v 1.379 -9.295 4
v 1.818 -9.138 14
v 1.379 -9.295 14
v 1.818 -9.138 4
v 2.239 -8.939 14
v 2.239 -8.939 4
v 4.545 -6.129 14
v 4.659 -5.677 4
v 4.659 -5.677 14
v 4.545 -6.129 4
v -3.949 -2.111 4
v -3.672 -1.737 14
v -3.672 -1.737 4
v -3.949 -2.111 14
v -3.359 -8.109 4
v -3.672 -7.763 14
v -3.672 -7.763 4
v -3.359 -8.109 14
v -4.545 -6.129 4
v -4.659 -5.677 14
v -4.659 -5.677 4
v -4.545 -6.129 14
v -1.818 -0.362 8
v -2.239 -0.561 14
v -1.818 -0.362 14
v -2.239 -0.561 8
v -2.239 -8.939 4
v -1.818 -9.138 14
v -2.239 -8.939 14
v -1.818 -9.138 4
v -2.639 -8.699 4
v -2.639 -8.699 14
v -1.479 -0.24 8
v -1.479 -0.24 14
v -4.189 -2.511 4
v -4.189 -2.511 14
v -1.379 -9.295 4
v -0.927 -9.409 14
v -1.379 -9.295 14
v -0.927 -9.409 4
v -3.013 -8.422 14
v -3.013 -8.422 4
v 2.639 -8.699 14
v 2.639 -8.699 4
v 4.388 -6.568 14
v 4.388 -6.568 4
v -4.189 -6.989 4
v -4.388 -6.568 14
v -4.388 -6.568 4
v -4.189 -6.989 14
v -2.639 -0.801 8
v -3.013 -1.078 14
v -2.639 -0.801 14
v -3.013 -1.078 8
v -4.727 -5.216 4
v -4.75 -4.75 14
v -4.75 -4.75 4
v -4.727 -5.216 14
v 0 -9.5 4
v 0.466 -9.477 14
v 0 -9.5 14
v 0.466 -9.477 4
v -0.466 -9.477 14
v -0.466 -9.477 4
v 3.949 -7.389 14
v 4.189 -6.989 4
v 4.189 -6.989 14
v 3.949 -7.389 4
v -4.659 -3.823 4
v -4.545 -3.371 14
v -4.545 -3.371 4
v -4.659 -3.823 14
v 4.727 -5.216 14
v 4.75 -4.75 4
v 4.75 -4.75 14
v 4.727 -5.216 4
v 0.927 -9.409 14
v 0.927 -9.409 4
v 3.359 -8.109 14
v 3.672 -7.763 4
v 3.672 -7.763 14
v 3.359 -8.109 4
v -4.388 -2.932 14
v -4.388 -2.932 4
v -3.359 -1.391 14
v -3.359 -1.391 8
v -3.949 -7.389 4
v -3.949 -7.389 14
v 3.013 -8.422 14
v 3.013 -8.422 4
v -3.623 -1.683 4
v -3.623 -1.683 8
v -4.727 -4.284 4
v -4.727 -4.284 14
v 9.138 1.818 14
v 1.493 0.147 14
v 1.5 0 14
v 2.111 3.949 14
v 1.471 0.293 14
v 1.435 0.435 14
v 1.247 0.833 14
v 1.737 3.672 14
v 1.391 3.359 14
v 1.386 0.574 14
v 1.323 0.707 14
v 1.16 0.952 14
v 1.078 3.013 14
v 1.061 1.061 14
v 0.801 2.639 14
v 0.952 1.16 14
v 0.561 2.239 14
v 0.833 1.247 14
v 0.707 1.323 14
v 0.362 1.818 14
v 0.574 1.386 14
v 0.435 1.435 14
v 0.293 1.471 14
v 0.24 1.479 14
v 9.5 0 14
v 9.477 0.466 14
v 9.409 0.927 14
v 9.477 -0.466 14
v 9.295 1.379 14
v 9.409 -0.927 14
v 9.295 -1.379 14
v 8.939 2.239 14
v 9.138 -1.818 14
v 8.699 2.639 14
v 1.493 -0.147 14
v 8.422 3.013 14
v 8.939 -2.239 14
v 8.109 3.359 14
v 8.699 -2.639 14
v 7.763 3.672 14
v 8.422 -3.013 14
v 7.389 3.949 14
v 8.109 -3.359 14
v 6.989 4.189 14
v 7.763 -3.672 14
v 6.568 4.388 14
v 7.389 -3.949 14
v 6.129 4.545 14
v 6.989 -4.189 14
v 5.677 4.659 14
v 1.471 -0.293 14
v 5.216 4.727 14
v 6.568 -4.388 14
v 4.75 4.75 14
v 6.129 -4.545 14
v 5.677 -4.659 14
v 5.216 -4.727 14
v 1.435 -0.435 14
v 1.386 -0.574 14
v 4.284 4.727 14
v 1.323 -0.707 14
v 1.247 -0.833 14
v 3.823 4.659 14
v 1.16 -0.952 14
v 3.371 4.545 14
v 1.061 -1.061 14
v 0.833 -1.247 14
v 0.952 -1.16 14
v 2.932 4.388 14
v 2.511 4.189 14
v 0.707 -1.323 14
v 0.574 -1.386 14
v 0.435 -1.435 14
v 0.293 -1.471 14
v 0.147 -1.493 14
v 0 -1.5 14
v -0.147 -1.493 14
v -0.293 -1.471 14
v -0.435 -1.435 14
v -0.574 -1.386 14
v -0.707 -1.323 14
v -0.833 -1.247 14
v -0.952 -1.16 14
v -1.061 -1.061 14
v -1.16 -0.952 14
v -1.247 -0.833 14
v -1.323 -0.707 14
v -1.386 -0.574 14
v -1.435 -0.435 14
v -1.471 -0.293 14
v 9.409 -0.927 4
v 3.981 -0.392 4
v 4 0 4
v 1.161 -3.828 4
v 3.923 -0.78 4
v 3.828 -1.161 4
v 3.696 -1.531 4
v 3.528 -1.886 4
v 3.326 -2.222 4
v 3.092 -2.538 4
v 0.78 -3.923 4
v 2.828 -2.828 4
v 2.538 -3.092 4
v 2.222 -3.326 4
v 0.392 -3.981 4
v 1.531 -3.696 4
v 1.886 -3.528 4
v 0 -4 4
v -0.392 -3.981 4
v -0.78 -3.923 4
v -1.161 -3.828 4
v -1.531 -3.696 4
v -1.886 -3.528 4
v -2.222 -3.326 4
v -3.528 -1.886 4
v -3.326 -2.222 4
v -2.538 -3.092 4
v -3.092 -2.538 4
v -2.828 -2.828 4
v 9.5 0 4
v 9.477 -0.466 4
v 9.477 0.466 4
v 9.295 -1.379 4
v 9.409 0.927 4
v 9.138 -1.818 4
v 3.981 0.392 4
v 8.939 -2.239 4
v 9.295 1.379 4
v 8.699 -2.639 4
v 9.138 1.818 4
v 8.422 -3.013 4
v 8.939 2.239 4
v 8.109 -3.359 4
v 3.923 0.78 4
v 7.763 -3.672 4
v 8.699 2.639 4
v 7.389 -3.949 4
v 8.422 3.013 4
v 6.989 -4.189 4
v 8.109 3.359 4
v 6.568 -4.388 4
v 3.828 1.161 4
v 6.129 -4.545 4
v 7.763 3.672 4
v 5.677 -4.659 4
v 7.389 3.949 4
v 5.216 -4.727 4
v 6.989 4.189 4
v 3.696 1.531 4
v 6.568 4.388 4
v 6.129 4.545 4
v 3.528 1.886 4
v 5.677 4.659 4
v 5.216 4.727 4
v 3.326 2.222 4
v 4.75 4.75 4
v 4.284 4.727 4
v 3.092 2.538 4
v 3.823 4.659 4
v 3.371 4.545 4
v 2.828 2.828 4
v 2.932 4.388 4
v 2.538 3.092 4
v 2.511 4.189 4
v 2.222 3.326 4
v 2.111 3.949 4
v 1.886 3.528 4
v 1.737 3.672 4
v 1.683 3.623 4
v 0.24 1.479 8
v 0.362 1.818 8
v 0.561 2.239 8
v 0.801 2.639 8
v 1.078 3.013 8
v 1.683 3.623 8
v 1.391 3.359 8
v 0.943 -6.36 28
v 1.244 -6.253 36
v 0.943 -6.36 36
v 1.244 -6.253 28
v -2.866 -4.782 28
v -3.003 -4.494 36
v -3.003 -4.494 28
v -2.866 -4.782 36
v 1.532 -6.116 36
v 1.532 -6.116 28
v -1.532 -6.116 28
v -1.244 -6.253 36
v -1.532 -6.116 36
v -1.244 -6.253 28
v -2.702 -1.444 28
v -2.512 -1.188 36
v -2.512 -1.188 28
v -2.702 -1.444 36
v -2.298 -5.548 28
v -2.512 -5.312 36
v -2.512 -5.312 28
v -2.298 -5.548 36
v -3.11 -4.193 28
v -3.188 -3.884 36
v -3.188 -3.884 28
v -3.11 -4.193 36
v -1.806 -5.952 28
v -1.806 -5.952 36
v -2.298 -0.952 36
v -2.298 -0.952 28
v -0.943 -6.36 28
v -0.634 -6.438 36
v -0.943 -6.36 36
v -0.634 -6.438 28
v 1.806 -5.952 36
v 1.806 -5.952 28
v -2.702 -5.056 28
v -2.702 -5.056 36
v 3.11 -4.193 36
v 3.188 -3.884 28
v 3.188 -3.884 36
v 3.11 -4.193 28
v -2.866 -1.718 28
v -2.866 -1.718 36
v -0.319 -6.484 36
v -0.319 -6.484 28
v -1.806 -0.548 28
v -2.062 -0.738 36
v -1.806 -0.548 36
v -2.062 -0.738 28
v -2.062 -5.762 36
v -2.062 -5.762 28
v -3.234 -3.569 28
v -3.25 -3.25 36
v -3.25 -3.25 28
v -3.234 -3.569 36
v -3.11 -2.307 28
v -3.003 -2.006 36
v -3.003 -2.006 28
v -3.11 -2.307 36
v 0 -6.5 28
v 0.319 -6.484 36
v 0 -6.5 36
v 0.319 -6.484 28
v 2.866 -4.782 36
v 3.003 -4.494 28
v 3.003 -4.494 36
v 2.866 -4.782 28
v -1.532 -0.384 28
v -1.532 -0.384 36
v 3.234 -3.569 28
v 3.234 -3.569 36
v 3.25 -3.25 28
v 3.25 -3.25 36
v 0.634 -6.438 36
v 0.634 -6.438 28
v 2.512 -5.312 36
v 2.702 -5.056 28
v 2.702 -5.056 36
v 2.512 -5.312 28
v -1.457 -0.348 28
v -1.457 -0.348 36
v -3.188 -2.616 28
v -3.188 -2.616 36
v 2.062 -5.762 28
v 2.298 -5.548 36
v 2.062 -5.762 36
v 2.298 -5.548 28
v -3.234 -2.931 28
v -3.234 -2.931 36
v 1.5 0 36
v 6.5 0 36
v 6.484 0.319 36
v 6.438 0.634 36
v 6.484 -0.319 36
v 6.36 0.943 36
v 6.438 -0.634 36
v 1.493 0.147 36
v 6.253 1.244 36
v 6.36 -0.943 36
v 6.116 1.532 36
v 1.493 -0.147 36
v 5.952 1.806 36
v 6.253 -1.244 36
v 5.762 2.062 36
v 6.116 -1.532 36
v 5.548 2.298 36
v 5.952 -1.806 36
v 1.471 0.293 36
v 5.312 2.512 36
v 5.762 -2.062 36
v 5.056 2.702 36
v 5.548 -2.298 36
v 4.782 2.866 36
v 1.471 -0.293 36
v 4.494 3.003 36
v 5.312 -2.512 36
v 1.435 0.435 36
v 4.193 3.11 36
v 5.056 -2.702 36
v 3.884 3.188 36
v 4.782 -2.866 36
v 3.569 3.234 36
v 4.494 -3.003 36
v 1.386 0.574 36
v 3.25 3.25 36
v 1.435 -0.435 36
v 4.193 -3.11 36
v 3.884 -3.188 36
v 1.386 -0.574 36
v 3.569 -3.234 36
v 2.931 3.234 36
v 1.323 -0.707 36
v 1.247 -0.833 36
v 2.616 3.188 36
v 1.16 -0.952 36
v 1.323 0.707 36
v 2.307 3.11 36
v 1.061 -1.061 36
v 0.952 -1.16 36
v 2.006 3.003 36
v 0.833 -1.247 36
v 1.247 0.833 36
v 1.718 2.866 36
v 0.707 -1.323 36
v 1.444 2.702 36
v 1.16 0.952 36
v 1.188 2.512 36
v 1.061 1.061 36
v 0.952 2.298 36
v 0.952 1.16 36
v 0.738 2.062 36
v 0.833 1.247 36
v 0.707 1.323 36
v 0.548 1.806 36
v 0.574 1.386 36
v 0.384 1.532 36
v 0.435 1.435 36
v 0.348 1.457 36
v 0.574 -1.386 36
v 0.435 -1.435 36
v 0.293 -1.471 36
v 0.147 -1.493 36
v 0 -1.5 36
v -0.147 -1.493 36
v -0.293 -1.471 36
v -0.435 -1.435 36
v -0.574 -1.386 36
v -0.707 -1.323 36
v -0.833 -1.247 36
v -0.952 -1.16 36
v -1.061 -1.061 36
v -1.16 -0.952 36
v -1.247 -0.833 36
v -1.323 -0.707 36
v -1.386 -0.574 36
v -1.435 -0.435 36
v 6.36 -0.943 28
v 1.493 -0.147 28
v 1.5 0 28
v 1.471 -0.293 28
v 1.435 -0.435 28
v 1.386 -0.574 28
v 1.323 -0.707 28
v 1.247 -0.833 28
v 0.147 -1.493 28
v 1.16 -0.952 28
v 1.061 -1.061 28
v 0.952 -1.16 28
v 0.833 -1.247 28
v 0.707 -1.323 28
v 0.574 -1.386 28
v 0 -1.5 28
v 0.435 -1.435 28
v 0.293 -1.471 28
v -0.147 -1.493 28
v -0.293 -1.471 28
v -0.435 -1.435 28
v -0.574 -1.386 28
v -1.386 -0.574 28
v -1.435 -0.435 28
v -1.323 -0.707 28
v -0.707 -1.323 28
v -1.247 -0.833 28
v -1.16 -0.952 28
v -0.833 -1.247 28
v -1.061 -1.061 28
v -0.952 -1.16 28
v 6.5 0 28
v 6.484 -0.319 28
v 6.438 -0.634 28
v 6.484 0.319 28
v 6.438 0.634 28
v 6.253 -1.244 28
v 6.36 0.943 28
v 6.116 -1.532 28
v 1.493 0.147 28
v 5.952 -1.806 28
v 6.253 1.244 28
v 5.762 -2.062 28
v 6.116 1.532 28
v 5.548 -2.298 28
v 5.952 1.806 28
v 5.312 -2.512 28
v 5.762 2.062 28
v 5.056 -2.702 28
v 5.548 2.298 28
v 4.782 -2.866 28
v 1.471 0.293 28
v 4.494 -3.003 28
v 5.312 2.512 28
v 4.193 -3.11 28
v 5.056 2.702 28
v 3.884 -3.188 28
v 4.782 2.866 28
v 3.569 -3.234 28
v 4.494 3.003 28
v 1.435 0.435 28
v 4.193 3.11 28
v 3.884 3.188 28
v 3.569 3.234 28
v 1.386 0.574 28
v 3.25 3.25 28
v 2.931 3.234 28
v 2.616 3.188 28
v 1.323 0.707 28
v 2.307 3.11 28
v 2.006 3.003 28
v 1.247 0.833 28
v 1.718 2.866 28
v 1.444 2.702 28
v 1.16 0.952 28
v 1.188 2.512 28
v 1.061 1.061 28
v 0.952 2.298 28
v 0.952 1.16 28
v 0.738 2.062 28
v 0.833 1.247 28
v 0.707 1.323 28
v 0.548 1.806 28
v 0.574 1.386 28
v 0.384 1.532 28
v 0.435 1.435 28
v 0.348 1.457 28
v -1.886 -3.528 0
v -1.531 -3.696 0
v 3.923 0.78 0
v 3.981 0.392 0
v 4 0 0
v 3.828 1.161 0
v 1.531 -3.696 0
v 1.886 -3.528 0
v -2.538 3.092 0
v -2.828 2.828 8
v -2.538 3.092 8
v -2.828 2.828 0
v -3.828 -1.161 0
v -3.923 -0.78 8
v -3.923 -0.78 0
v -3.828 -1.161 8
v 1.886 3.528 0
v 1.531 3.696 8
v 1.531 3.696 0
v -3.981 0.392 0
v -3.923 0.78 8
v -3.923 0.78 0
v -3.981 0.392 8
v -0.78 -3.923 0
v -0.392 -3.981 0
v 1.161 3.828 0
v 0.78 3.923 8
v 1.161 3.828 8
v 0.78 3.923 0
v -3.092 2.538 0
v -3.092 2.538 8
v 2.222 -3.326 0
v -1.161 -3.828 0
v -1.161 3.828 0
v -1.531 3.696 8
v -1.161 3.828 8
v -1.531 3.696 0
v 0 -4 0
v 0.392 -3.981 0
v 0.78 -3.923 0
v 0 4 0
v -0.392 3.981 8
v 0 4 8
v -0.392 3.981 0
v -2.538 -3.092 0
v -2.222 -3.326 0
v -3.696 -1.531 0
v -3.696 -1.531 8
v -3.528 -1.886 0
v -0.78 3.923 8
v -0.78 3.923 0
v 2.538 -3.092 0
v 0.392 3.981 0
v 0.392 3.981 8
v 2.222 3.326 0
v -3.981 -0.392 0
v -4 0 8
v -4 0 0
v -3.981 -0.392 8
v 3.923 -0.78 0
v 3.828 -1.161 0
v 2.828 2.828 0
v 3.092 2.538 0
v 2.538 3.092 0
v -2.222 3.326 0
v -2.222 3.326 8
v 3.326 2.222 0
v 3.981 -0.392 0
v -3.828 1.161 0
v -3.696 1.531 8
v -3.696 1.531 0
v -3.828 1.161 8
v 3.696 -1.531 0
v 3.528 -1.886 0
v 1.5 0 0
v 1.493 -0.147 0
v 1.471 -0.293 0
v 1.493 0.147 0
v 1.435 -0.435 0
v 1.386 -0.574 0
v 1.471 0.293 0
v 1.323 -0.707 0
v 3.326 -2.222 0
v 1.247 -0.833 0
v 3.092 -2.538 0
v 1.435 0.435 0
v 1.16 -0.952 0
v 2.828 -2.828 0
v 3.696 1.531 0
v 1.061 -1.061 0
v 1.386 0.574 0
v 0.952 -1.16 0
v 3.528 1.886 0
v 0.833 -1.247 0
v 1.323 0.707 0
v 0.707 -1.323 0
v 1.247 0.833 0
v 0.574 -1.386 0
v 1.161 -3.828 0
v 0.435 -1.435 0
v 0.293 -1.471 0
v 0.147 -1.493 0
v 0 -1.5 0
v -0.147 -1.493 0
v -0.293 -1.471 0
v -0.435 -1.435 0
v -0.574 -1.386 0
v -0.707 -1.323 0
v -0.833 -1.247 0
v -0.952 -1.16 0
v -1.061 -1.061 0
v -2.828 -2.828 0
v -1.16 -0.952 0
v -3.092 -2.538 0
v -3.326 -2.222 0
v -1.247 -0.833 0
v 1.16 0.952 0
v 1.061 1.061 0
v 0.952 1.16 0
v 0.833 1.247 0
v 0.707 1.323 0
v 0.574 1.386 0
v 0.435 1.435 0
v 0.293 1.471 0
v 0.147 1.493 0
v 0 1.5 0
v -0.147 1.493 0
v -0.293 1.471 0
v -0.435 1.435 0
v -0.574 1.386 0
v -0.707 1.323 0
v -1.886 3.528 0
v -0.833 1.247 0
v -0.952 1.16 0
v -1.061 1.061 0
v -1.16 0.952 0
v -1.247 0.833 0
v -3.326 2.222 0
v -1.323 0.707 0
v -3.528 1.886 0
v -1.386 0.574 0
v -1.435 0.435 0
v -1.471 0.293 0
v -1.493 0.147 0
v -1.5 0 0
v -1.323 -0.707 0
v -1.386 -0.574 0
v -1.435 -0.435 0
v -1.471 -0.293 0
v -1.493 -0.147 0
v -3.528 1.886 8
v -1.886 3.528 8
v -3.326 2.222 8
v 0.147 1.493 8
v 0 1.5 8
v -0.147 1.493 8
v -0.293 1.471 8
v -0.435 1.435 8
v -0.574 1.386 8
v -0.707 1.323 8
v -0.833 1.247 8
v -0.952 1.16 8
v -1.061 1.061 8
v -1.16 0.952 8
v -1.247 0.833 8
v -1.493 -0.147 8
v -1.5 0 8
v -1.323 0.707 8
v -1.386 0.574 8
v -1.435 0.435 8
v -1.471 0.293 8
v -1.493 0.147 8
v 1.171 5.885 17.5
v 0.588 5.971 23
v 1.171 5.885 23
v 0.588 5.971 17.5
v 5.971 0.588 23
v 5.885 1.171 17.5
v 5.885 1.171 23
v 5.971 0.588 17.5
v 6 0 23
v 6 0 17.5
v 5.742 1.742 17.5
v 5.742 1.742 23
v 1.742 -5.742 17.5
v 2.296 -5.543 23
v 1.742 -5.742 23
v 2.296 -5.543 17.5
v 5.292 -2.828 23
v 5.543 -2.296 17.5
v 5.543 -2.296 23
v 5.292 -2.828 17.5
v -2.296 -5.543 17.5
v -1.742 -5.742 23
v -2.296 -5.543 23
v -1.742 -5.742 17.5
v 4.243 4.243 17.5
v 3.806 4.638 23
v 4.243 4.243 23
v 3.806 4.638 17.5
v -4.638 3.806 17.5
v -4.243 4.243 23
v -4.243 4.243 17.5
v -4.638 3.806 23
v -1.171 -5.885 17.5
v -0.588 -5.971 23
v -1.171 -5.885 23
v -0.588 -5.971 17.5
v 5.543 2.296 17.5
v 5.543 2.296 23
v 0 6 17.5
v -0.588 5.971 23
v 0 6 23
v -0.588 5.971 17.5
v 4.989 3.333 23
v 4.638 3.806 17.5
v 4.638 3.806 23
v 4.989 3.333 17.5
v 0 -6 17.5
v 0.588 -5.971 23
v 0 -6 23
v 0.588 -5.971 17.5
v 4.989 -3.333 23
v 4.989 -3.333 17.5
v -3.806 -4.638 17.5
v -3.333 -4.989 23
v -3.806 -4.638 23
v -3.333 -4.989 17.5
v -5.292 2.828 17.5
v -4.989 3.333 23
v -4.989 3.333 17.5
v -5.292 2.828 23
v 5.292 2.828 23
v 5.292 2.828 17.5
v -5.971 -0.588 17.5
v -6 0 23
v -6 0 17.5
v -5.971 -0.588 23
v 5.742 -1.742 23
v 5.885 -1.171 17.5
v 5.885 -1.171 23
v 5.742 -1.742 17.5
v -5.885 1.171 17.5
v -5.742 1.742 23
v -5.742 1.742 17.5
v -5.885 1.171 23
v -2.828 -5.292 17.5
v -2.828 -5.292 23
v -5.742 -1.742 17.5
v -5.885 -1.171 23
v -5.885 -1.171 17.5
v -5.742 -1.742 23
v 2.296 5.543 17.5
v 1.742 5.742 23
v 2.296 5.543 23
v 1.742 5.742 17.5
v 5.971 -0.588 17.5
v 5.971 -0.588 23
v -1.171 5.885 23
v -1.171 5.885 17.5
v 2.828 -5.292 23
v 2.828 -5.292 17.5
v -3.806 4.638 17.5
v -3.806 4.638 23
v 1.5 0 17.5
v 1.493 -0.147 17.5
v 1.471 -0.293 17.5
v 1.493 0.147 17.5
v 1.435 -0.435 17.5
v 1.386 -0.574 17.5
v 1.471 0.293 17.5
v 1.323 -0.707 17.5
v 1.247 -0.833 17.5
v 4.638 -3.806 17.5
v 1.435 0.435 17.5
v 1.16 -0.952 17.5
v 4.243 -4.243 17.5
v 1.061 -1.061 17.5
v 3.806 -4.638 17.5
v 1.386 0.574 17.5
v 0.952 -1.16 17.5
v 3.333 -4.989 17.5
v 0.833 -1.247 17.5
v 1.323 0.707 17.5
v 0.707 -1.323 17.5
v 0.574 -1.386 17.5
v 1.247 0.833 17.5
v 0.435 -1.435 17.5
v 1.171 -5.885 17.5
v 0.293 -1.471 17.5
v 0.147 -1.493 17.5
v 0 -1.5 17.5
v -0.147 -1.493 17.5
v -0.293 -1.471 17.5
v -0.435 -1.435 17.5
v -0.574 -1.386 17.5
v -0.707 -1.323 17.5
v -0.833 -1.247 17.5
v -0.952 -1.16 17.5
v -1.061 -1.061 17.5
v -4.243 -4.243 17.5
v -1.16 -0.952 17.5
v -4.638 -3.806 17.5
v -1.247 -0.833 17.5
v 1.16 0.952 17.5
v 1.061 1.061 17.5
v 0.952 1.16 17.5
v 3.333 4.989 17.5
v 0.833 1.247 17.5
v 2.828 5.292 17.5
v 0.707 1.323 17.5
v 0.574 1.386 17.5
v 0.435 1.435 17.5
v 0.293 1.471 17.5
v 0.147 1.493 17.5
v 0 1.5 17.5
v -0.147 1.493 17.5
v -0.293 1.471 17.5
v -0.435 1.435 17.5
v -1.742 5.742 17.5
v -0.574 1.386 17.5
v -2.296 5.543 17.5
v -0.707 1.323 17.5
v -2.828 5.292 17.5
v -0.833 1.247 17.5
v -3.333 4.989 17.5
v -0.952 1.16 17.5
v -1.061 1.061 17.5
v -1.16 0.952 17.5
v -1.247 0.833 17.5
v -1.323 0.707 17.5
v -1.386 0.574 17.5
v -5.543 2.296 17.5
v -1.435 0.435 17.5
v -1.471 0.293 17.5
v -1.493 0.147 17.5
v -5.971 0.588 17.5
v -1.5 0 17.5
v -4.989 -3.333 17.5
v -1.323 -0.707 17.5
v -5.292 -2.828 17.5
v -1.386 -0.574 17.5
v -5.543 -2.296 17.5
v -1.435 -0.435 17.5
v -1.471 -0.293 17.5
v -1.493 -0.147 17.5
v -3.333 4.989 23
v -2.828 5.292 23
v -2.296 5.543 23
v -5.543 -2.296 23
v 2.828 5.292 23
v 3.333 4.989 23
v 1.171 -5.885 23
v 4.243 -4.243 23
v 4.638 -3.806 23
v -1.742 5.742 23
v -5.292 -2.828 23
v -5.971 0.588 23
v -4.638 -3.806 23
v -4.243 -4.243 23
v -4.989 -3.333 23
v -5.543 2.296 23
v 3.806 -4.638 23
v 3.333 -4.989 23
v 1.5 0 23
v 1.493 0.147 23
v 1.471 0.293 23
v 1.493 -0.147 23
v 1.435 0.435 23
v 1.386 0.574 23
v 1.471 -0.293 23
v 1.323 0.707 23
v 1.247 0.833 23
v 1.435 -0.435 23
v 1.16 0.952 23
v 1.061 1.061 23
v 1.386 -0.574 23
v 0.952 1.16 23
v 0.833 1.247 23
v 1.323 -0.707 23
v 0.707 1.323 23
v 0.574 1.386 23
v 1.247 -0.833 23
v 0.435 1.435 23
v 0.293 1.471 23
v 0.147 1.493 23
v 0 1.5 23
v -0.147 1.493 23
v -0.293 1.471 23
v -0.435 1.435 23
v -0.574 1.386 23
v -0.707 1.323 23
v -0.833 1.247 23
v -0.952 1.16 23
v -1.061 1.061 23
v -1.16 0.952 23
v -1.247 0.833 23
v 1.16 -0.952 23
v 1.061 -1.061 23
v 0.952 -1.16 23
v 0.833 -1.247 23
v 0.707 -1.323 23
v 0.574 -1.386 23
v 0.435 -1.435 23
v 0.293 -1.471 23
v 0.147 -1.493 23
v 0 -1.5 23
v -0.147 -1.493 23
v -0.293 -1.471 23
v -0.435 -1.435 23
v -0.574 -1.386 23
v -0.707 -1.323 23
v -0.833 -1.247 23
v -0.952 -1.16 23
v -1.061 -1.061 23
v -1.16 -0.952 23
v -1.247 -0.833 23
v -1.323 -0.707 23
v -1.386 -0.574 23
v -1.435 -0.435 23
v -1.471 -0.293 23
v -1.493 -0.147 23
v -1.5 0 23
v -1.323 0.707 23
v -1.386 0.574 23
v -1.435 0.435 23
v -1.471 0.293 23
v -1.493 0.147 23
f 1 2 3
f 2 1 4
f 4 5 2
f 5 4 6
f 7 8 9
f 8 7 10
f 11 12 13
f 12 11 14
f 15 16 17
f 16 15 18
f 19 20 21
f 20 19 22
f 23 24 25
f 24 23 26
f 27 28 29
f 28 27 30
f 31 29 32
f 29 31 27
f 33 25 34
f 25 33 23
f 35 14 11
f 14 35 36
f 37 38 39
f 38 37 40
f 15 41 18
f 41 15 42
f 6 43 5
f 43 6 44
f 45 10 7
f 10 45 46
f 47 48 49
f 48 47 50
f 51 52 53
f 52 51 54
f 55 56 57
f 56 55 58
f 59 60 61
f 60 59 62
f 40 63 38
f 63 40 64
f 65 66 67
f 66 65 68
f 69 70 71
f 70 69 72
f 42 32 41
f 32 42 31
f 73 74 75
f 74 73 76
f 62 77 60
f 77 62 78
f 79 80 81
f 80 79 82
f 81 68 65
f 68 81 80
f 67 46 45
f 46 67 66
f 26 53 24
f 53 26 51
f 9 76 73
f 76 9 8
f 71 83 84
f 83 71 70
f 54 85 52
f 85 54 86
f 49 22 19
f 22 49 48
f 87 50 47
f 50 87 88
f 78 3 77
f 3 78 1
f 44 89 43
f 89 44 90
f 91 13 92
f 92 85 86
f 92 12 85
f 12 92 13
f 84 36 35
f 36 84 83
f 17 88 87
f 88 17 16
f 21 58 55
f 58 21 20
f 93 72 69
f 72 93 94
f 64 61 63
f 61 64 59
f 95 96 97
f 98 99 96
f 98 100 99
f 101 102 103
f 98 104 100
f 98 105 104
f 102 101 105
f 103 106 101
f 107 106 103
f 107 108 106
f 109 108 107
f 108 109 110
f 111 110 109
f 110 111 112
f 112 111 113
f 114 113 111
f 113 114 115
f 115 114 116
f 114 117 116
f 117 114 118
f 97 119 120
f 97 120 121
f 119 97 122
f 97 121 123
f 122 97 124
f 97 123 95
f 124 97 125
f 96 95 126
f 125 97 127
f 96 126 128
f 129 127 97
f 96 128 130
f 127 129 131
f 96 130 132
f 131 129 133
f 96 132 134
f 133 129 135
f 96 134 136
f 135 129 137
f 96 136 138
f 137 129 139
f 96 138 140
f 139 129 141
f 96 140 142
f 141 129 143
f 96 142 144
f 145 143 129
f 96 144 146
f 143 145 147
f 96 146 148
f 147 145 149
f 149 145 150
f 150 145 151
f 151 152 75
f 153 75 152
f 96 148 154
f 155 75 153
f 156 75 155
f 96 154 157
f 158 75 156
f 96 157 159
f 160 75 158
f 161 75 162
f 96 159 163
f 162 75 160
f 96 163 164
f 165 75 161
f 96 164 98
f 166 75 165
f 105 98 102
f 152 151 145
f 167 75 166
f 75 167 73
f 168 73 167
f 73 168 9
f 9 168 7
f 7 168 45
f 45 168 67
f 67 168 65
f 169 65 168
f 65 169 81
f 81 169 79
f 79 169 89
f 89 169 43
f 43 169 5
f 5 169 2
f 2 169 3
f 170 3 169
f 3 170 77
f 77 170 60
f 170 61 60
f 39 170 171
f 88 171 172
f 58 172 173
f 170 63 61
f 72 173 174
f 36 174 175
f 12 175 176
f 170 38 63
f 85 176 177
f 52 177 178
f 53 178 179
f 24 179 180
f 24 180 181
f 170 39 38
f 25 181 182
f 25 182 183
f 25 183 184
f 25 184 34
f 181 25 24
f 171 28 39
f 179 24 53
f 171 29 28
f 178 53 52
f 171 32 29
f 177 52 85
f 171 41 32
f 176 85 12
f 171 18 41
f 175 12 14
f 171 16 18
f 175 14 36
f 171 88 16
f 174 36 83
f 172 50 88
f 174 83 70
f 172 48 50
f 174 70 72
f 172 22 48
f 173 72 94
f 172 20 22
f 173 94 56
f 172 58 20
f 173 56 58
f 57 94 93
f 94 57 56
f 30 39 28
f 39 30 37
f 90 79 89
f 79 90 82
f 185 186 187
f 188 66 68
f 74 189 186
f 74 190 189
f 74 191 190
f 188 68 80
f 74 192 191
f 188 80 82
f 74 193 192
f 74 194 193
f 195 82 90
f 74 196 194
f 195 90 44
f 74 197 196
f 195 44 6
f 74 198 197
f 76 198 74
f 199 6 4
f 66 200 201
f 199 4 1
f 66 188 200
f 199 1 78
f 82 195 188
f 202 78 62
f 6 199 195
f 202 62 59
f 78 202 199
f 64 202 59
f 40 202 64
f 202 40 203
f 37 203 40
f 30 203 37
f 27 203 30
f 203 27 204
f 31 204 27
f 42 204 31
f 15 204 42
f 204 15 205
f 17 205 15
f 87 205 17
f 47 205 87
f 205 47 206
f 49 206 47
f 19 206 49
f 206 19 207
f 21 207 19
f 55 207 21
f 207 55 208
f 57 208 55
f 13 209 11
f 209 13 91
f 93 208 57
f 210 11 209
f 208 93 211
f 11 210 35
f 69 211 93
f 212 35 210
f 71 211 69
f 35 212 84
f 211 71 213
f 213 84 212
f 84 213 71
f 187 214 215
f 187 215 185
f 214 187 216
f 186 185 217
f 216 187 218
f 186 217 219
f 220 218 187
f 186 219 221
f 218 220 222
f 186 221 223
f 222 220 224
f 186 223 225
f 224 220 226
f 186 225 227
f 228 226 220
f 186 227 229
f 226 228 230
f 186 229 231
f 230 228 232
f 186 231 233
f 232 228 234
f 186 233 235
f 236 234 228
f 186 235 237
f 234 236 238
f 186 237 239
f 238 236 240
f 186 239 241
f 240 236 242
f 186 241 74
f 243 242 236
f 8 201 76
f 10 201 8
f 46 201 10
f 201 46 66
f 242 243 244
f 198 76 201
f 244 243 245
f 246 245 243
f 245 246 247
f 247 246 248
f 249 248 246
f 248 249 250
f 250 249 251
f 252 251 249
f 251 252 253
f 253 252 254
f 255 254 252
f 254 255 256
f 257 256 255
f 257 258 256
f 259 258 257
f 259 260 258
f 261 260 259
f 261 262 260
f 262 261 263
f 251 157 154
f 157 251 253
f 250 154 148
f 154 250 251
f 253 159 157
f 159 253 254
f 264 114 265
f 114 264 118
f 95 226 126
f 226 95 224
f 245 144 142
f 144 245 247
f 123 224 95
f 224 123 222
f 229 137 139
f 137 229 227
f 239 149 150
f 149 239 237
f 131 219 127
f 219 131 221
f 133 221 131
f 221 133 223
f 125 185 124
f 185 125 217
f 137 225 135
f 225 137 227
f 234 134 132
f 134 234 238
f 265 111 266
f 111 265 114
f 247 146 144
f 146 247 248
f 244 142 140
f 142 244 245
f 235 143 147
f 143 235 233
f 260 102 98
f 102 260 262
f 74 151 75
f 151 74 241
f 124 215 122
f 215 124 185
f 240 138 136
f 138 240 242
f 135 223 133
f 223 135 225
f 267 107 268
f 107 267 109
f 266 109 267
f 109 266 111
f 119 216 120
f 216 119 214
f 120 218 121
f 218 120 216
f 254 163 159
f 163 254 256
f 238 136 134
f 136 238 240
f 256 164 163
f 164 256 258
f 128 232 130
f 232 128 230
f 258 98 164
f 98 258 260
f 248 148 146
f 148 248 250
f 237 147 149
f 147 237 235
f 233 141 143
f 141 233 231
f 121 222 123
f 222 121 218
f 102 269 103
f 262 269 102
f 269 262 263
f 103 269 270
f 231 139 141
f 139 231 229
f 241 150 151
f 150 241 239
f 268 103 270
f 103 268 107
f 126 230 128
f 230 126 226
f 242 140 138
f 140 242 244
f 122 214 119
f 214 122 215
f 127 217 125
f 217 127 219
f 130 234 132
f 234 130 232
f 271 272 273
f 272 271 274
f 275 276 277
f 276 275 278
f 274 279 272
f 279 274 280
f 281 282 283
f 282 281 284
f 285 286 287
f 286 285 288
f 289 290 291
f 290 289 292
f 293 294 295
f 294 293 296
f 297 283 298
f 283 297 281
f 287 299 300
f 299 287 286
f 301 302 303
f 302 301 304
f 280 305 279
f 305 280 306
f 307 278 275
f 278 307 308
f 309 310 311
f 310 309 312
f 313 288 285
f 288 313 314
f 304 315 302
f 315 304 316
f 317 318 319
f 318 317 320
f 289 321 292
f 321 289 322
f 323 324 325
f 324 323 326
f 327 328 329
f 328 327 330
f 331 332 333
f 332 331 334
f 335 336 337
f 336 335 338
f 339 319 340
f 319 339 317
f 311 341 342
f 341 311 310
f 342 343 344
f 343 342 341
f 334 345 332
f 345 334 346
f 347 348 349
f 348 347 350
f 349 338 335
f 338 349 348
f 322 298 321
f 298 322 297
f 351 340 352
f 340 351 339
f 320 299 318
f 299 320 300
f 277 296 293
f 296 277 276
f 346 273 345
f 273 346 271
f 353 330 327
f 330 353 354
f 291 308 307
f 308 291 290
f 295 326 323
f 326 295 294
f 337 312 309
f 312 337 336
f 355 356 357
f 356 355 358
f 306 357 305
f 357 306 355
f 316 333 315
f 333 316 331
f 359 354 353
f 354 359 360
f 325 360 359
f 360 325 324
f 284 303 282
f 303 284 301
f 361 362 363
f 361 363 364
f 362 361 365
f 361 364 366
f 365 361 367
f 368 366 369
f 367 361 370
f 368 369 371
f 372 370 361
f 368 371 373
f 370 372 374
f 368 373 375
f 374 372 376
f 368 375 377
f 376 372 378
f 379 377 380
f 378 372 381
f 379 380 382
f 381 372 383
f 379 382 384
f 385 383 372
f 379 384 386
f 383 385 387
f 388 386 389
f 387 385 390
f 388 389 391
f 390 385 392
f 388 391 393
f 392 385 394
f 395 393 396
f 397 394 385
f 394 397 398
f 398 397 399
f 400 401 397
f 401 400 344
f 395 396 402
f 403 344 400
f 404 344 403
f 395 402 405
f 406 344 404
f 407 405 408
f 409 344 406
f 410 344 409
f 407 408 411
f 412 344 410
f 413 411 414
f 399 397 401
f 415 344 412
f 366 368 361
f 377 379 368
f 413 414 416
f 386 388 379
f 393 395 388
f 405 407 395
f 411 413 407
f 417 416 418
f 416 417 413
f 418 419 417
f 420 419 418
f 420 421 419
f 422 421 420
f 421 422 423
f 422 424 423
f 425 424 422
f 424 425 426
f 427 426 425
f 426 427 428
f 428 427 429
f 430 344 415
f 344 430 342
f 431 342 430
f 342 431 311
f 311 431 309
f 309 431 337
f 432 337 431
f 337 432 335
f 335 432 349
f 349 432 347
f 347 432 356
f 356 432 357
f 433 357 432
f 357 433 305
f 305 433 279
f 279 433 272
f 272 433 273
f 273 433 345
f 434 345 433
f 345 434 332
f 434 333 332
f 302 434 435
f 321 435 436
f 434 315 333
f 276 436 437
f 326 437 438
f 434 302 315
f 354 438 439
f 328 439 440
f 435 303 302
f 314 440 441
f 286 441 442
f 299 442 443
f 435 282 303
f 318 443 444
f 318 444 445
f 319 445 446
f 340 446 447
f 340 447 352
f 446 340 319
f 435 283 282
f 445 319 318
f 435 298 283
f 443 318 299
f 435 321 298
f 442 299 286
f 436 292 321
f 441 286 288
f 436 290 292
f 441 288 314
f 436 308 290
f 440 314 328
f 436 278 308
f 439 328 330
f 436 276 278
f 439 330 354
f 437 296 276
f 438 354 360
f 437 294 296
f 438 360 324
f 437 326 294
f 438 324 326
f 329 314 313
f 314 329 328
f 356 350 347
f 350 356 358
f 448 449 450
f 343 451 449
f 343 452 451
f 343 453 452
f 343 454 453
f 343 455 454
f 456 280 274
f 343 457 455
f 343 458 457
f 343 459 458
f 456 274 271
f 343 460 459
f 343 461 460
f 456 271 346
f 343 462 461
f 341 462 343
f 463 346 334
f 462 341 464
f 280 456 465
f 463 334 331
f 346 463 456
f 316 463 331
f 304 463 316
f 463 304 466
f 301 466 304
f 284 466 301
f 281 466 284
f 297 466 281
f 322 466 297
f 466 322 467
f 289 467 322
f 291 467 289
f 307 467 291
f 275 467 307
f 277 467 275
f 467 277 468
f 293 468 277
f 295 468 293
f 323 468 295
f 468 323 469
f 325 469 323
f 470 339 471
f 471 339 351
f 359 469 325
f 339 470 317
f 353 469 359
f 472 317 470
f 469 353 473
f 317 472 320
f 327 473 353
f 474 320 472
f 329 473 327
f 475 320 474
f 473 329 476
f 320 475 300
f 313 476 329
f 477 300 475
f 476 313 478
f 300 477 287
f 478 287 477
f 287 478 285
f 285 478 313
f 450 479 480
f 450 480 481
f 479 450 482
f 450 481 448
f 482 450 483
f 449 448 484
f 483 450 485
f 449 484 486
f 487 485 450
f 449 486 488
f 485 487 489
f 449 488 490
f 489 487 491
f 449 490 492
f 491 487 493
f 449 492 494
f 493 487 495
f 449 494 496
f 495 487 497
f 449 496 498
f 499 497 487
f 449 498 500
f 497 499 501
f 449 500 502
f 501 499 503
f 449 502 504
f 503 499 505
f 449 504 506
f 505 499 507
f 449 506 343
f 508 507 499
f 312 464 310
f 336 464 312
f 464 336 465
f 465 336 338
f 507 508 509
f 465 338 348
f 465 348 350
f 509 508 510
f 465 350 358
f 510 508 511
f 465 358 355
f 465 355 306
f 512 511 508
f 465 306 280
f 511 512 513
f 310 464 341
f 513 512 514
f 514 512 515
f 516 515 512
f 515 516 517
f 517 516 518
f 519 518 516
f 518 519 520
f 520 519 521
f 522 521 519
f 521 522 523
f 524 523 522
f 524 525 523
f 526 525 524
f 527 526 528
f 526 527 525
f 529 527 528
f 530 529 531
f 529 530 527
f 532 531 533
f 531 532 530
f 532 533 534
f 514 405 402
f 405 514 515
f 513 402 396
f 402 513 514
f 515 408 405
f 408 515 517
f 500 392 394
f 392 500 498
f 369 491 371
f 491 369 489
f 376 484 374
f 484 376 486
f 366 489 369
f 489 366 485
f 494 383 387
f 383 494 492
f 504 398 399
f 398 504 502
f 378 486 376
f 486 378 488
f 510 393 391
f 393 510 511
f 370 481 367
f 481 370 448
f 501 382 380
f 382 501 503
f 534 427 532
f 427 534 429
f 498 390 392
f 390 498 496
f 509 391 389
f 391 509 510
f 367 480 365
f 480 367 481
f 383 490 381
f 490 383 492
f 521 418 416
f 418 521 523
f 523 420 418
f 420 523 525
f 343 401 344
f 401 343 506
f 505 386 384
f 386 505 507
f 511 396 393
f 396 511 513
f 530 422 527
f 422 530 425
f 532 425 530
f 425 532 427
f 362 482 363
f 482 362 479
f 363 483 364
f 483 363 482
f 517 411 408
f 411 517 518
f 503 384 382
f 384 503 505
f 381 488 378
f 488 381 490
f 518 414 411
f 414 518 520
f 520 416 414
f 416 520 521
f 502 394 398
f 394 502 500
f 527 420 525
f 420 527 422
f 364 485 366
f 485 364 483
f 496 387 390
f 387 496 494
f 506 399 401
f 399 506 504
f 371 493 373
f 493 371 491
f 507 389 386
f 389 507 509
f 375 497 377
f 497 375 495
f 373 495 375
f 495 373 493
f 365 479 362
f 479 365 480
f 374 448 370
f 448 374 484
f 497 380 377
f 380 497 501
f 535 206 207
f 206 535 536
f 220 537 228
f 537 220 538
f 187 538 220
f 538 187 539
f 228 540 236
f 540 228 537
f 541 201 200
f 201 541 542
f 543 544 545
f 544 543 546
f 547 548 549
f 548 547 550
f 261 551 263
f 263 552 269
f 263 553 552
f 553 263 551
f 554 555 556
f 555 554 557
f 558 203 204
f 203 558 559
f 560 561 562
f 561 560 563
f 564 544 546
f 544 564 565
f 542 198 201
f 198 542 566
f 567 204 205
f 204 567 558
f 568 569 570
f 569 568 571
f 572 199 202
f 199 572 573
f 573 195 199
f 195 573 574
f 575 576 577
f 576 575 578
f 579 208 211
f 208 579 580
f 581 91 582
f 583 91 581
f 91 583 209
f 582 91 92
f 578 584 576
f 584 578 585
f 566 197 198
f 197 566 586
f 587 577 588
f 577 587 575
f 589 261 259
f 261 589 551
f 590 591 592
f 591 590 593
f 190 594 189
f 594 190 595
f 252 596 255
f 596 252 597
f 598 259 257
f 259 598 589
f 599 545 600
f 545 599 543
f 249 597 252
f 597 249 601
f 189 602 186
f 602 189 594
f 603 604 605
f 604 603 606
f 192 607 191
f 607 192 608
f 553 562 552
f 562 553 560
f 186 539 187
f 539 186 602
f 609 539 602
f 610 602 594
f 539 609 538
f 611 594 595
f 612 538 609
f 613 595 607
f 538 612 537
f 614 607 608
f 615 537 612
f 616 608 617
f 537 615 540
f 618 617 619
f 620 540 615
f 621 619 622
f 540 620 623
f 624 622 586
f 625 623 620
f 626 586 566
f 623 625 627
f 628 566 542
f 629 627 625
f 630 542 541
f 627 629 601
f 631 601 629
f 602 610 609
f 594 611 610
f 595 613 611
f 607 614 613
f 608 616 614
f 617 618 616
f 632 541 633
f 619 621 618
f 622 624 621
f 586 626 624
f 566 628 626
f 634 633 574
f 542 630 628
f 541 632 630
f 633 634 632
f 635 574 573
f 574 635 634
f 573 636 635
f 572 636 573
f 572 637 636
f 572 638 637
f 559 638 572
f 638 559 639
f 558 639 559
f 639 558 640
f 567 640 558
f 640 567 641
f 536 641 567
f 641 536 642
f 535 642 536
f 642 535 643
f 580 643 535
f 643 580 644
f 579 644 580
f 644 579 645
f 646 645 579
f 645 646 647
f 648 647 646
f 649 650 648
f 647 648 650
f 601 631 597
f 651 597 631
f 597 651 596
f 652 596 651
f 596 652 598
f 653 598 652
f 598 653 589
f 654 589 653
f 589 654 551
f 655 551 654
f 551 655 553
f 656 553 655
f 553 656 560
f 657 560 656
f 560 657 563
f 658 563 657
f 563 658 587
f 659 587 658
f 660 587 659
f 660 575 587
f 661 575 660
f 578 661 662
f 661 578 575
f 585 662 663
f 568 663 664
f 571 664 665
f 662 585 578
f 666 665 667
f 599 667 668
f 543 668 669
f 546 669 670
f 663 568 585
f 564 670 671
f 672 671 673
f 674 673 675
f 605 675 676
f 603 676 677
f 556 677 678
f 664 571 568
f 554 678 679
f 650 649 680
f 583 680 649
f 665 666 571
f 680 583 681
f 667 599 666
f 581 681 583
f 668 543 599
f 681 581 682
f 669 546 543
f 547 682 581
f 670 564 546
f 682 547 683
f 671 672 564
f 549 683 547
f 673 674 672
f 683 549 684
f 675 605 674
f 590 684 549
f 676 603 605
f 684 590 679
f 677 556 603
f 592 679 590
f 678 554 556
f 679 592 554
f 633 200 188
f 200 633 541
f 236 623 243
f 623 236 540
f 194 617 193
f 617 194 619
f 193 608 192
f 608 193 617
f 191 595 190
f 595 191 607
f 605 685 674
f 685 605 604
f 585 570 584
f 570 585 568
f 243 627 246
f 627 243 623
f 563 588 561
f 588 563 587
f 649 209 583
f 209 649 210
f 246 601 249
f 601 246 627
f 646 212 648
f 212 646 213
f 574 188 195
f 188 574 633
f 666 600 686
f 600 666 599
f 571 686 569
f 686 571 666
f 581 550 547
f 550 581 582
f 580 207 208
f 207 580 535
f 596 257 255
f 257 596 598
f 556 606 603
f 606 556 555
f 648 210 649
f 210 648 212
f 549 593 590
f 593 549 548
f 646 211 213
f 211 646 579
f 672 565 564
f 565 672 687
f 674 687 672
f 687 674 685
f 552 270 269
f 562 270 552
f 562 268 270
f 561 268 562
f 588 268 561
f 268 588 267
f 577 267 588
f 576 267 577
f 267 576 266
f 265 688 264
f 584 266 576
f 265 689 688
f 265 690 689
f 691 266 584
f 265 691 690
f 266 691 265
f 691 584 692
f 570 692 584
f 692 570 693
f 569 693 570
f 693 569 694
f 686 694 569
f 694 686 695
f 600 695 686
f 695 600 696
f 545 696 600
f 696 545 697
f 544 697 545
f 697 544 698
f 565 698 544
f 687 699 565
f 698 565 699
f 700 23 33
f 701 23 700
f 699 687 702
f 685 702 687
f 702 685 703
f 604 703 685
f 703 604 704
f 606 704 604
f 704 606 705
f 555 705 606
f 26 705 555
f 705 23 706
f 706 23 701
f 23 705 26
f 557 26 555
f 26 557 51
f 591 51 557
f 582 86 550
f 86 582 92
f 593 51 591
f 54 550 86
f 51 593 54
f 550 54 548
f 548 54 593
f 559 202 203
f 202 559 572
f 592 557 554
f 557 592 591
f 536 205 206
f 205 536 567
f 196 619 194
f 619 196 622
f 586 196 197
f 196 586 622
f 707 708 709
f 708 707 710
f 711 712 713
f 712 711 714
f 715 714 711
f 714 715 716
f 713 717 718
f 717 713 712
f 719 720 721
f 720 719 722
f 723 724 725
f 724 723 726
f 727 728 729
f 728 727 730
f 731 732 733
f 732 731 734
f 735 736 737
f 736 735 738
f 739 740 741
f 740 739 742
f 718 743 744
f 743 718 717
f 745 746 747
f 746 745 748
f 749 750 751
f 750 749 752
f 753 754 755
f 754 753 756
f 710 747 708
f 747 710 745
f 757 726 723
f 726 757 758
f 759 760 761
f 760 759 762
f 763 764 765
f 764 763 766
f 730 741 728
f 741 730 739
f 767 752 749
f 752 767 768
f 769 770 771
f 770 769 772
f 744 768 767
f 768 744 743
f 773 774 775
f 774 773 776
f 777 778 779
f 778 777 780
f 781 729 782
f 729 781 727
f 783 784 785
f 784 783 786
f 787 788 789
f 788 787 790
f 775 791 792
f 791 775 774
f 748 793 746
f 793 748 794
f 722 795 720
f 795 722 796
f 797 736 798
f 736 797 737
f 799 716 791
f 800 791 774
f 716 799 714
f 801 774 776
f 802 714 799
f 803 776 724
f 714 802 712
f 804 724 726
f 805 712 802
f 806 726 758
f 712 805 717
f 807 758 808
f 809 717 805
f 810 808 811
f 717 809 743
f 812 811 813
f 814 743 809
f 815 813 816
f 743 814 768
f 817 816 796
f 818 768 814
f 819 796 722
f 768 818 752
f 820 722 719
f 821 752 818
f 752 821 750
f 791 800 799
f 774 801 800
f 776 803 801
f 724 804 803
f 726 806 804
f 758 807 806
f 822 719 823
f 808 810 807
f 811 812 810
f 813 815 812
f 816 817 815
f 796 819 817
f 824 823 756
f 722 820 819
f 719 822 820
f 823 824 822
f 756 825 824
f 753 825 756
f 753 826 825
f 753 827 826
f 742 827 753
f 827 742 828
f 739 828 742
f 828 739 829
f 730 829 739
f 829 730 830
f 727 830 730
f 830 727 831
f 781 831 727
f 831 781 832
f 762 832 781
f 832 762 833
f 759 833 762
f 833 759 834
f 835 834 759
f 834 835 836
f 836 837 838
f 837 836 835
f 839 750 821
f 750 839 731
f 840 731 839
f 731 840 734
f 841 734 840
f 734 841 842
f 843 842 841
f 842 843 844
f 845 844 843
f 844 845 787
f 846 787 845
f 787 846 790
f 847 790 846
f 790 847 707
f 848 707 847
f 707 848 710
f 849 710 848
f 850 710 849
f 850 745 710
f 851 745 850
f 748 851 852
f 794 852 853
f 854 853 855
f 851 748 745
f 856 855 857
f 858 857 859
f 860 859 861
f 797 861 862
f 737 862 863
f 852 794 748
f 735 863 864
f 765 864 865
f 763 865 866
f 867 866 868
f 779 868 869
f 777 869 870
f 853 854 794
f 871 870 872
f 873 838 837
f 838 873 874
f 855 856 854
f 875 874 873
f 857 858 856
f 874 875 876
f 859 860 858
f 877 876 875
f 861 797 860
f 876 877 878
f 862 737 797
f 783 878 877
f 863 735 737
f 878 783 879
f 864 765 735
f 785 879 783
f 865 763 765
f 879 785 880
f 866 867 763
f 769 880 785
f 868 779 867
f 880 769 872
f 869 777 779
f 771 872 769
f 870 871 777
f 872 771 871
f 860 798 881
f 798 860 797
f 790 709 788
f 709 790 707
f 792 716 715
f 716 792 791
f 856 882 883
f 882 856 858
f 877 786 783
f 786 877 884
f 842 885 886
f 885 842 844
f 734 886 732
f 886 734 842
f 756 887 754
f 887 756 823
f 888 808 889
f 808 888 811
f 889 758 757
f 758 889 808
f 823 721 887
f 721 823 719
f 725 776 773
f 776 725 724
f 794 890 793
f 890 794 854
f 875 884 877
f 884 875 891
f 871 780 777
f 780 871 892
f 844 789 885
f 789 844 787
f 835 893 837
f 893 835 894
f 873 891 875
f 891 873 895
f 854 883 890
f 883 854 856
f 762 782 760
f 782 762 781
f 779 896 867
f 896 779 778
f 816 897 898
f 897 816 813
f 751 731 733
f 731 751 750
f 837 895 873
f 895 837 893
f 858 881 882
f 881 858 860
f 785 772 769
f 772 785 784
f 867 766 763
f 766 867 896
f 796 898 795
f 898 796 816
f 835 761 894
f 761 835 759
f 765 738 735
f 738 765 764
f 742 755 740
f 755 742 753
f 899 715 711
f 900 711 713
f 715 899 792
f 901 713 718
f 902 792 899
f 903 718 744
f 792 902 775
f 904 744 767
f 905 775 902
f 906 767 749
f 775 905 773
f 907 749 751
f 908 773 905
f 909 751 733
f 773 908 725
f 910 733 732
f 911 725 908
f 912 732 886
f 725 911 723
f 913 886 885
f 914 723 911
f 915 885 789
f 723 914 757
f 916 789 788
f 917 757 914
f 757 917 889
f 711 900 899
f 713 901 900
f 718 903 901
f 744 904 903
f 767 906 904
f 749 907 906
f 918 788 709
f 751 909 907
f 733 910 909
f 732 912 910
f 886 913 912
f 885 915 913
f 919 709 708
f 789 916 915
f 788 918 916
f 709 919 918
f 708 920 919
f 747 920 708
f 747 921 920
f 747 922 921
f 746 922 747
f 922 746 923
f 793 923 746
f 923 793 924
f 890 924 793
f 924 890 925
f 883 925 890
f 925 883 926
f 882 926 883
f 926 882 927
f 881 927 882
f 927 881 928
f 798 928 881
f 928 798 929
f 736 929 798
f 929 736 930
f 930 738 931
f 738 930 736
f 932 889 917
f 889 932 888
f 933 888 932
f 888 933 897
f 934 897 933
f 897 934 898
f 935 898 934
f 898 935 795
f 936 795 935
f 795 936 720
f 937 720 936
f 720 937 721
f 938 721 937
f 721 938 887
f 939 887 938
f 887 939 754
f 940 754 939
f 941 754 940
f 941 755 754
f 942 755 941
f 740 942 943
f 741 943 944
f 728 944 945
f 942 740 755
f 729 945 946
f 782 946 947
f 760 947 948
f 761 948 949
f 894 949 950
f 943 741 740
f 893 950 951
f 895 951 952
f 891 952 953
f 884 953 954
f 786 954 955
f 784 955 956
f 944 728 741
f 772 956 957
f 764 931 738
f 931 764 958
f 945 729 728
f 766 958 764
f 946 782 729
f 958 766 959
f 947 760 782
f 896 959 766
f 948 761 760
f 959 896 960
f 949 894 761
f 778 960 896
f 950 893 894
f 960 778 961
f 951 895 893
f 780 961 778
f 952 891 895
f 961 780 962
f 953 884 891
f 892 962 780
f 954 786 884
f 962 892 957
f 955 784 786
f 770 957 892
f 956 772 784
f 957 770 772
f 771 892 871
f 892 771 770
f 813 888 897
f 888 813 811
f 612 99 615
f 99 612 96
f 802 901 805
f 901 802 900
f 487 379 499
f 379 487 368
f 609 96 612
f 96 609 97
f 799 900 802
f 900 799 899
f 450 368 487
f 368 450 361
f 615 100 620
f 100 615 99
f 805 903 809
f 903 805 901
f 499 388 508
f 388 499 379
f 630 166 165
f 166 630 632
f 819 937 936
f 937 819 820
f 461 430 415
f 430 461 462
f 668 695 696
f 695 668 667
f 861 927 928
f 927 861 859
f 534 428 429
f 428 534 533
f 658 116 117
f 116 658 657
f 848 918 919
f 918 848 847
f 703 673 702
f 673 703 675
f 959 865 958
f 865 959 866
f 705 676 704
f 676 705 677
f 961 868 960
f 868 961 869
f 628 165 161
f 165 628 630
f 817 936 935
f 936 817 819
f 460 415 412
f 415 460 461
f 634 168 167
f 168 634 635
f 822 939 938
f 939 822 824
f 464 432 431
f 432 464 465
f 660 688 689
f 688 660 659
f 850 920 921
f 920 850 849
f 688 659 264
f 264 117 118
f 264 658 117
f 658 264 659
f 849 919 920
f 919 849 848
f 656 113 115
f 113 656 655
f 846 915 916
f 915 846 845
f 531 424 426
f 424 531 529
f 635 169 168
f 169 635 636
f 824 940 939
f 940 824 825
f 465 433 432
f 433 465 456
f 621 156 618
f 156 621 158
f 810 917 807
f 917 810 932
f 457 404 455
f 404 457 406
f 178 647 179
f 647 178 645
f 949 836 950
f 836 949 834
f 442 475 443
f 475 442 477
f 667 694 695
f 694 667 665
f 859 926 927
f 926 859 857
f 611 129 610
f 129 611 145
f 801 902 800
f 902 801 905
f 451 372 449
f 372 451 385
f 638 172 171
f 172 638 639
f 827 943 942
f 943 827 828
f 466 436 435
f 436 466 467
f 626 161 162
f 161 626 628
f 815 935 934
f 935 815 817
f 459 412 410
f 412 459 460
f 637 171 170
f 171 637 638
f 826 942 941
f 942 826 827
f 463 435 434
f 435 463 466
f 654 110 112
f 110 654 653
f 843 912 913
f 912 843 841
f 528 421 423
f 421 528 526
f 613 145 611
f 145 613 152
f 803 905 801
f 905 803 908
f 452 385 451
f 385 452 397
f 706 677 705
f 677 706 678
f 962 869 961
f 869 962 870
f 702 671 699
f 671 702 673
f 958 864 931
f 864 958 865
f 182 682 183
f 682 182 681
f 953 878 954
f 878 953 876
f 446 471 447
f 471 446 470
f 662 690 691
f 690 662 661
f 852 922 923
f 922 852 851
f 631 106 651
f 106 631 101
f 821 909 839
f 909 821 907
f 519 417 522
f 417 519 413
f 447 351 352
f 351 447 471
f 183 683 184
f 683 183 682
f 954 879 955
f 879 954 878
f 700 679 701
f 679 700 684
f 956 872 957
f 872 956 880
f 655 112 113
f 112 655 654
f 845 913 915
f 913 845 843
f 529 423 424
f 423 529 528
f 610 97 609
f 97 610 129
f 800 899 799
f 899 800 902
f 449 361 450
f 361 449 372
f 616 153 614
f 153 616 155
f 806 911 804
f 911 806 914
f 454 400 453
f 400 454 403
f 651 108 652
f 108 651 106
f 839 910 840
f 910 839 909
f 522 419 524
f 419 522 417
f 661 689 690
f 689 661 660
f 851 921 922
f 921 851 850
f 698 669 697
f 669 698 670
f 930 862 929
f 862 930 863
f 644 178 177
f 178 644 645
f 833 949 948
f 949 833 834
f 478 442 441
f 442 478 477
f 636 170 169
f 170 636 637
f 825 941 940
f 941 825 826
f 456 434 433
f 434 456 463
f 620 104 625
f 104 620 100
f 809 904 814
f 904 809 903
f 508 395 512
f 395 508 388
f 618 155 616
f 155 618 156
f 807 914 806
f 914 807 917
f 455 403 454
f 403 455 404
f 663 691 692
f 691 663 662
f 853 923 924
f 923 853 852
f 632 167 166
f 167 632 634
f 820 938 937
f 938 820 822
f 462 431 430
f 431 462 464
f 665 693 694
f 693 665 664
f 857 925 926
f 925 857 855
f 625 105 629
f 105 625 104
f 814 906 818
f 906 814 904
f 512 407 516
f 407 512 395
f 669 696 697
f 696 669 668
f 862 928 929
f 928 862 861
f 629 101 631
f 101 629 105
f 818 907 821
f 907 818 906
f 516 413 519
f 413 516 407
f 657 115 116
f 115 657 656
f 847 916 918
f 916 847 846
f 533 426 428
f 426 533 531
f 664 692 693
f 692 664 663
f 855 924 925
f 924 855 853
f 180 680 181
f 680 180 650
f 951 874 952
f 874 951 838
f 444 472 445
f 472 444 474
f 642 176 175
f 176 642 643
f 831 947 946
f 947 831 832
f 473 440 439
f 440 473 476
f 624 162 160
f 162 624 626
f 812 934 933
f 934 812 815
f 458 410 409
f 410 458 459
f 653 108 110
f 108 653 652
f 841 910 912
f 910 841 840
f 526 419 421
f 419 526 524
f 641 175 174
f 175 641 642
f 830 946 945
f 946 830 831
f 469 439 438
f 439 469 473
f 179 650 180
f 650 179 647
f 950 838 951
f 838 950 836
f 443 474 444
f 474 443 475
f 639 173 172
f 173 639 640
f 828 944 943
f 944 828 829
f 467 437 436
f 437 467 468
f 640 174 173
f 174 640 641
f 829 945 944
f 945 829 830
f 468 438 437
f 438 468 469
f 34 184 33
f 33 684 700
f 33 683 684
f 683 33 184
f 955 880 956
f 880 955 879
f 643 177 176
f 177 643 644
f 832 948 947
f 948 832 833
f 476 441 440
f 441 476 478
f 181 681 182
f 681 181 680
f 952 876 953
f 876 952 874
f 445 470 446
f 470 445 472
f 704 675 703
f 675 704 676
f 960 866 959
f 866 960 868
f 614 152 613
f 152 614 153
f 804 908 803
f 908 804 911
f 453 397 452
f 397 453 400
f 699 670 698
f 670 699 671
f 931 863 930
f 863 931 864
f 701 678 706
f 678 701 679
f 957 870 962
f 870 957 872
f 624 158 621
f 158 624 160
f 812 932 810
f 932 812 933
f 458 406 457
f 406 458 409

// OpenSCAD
// Hose-barb reducer: 8 mm tubing (barbed) to 5 mm tubing (barbed)
// Print orientation: standing upright along Z

$fn = 64;

// ---- 8 mm tubing section (barbed) ----
tubing_od_8 = 8;            // tubing outer diameter
barb_count_8 = 2;           // number of barbs
barb_height_8 = 10;         // barb height from top of tubing
barb_od_8 = 9.5;            // barb outer diameter (slightly larger)

// ---- Collar section ----
collar_od = 12;             // collar outer diameter
collar_h = 5;               // collar height

// ---- 5 mm tubing section (barbed) ----
tubing_od_5 = 5;            // tubing outer diameter
barb_count_5 = 2;           // number of barbs
barb_height_5 = 8;          // barb height from top of tubing
barb_od_5 = 6.5;            // barb outer diameter (slightly larger)

// ---- Misc ----
eps = 0.5;                  // overlap for clean booleans

total_h = tubing_od_8 + barb_height_8 + collar_h + tubing_od_5 + barb_height_5;

difference() {
    union() {
        // Tubing body
        cylinder(h = tubing_od_8, d = tubing_od_8);

        // Barbs for 8 mm tubing
        for (i = [0 : barb_count_8 - 1])
            rotate([0, 0, i * 180 / barb_count_8])
                translate([0, -barb_od_8 / 2, tubing_od_8 / 2])
                    cylinder(h = barb_height_8, d = barb_od_8);

        // Collar
        translate([0, 0, tubing_od_8 + barb_height_8 - eps])
            cylinder(h = collar_h + eps, d = collar_od);

        // Barbs for 5 mm tubing
        for (i = [0 : barb_count_5 - 1])
            rotate([0, 0, i * 180 / barb_count_5])
                translate([0, -barb_od_5 / 2, total_h - barb_height_5])
                    cylinder(h = barb_height_5, d = barb_od_5);
    }

    // Through bore
    translate([0, 0, -eps])
        cylinder(h = total_h + 2 * eps, d = 3);
}
